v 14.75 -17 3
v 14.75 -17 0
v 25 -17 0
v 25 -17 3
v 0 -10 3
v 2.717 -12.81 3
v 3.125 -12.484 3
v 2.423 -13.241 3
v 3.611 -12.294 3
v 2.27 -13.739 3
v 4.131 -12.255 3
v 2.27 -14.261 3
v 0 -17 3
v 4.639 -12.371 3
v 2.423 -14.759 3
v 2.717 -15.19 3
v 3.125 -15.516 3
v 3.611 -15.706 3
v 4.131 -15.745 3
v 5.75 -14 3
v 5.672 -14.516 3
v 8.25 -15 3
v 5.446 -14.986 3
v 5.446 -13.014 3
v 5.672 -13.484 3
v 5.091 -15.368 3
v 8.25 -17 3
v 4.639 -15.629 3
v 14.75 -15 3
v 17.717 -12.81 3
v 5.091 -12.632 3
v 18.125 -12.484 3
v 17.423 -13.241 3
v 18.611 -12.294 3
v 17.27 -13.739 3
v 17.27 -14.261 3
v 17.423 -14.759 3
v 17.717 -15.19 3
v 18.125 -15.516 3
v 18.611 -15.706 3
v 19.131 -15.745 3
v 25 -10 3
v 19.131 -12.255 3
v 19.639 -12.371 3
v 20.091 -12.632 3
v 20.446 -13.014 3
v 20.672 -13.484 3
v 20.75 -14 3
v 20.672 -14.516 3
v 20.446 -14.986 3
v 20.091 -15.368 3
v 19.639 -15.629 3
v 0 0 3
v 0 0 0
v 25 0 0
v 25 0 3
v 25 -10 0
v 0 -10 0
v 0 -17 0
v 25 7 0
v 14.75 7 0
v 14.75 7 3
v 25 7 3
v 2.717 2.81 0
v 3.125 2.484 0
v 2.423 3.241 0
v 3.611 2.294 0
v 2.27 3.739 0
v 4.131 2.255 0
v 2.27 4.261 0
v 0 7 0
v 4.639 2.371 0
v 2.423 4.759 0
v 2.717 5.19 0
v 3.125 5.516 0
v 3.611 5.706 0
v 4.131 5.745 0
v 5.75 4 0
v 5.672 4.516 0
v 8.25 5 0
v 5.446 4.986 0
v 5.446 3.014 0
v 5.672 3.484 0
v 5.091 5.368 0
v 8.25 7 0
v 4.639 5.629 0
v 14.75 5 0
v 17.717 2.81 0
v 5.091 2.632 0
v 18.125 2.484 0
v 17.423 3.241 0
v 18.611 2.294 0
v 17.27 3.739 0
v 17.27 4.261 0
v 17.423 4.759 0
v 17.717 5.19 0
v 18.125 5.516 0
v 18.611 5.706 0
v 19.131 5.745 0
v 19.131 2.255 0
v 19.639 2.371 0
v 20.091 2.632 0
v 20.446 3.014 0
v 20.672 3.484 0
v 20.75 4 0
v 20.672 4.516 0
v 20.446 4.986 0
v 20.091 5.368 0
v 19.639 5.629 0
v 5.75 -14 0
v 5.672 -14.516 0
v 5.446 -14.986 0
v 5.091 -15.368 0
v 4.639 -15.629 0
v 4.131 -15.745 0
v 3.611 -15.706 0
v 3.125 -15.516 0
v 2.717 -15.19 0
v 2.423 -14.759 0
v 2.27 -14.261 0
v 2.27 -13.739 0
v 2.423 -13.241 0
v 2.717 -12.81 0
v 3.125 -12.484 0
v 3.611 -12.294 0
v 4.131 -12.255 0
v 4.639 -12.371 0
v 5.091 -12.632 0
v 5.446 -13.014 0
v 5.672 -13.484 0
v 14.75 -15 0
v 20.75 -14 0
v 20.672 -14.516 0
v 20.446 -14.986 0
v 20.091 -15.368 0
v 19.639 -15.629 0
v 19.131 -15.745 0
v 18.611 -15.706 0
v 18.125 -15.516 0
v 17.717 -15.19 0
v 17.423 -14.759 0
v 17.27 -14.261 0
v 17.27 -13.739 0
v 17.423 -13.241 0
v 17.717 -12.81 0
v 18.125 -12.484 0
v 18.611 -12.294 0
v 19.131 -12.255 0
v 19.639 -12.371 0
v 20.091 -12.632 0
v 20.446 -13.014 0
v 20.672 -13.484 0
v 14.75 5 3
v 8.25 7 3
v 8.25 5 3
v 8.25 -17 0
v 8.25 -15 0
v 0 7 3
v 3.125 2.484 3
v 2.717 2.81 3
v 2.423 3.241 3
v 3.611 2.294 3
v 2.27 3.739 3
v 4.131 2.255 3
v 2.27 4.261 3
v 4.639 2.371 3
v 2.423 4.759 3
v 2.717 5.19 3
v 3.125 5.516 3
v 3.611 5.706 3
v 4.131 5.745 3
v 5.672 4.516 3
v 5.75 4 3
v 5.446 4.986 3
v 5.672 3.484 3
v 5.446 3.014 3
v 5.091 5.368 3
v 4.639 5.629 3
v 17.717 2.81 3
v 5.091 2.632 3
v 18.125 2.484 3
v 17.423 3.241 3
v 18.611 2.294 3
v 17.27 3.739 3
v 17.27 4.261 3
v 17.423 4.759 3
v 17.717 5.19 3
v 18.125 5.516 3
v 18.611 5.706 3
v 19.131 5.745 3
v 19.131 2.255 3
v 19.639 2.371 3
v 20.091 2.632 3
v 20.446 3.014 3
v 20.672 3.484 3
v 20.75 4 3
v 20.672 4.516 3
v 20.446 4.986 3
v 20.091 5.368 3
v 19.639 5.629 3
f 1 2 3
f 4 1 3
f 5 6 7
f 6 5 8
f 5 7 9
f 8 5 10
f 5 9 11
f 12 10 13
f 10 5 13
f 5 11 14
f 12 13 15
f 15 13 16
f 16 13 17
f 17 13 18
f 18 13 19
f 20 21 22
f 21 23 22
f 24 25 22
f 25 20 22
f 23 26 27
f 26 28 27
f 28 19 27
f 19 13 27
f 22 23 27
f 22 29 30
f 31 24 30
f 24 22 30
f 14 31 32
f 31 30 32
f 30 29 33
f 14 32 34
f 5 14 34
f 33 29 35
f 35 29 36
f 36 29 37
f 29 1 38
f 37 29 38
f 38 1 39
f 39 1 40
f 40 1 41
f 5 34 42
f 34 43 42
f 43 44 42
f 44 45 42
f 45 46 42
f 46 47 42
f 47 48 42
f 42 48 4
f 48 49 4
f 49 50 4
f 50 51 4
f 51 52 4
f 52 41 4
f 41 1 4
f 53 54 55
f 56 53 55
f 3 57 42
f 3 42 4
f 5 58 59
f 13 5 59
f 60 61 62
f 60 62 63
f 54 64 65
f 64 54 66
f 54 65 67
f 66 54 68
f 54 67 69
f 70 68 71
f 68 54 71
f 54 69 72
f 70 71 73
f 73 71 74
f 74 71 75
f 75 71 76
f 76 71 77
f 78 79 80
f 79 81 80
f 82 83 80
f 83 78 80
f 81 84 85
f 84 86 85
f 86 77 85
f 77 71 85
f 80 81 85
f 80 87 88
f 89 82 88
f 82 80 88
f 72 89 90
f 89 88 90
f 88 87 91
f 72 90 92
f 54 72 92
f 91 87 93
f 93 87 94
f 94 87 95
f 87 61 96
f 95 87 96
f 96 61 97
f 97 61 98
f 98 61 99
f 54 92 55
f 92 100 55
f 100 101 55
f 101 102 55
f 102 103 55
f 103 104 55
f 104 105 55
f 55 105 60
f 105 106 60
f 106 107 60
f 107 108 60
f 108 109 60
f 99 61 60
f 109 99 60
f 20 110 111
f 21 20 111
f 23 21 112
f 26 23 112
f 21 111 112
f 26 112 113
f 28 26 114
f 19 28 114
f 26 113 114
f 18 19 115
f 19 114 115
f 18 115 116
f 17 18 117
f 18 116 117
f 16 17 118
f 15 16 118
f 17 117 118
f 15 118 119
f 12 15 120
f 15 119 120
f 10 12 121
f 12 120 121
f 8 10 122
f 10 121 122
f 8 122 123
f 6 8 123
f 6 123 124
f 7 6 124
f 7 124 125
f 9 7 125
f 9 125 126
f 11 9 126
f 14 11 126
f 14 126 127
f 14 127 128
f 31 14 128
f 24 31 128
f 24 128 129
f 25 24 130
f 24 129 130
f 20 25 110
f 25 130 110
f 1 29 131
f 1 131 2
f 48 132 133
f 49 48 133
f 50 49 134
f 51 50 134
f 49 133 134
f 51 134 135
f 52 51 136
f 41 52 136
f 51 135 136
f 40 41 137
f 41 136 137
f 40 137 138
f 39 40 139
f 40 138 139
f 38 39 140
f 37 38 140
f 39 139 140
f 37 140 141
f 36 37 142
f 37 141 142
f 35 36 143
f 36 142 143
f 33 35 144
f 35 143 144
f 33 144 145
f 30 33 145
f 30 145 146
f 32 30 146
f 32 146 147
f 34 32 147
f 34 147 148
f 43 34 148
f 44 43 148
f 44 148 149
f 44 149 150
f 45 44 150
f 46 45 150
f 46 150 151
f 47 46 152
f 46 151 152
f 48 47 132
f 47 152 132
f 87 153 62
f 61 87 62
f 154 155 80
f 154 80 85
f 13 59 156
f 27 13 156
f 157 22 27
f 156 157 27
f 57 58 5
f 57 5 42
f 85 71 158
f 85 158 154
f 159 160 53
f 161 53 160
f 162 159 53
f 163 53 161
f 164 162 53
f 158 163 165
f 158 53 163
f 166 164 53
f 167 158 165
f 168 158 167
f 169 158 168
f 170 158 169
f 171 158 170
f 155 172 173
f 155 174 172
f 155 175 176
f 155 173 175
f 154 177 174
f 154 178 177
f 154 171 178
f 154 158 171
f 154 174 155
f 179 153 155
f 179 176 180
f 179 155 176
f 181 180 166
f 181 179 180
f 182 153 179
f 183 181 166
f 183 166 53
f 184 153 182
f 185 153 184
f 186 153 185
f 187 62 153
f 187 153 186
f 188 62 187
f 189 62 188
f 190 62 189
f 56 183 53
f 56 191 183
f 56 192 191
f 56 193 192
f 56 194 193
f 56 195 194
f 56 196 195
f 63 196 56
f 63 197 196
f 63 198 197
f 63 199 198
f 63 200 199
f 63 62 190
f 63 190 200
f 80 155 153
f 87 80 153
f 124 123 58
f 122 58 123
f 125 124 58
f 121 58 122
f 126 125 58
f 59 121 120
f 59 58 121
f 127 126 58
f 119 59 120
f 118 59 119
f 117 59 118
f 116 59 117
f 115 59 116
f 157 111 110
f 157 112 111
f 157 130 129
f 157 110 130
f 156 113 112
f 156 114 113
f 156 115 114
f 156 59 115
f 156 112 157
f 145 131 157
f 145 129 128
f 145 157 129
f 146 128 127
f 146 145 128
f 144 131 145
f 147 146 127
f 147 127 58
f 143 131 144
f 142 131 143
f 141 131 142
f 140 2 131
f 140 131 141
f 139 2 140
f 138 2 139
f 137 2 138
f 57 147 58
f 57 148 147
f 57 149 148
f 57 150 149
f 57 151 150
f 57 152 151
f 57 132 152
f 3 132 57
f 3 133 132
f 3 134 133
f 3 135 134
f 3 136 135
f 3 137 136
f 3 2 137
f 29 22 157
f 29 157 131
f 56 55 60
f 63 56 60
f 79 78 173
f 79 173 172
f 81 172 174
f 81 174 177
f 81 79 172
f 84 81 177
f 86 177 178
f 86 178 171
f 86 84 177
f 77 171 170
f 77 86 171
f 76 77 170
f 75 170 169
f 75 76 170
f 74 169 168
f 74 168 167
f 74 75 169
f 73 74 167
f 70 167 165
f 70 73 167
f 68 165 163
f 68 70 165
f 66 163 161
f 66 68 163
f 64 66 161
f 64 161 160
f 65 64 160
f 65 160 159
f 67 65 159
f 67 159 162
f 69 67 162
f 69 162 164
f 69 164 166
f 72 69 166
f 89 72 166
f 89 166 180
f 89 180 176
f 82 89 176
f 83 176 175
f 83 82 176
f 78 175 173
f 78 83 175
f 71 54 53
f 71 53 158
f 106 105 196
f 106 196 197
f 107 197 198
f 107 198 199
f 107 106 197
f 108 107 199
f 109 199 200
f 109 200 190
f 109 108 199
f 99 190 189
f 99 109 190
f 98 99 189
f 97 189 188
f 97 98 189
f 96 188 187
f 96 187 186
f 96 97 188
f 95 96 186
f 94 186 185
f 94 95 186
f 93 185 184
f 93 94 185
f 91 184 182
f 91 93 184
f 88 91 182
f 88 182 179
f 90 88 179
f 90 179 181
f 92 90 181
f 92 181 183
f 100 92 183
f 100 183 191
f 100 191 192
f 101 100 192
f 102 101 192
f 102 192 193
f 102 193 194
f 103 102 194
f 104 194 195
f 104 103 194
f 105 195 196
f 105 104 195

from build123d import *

# Parameters (mm, degrees)
F0_W     = 25
F0_H     = 7
F0_R     = 1.75
F1_DEPTH = 3
F2_W     = 6.5
F2_H     = 2
F3_DEPTH = 3.001


with BuildPart() as f1:
    # F0 (on Top) → F1 (new body)
    with BuildSketch(Plane.XY):
        with Locations((12.5, 3.5)):
            Rectangle(F0_W, F0_H)
        with Locations((4, 4)):
            Circle(F0_R, mode=Mode.SUBTRACT)
        with Locations((19, 4)):
            Circle(F0_R, mode=Mode.SUBTRACT)
    extrude(amount=F1_DEPTH)

    # F2 (on face) → F3 (cut, through all)
    with BuildSketch(Plane.XY.offset(3)):
        with Locations((11.5, 6)):
            Rectangle(F2_W, F2_H)
    extrude(amount=-F3_DEPTH, mode=Mode.SUBTRACT)


with BuildPart() as f5_1:
    # F5: instance of F1
    add(f1.part.mirror(Plane(origin=(12.5, -5, 1.5), x_dir=(1, 0, 0), z_dir=(0, -1, 0))))


solid = Compound([f1.part, f5_1.part])
